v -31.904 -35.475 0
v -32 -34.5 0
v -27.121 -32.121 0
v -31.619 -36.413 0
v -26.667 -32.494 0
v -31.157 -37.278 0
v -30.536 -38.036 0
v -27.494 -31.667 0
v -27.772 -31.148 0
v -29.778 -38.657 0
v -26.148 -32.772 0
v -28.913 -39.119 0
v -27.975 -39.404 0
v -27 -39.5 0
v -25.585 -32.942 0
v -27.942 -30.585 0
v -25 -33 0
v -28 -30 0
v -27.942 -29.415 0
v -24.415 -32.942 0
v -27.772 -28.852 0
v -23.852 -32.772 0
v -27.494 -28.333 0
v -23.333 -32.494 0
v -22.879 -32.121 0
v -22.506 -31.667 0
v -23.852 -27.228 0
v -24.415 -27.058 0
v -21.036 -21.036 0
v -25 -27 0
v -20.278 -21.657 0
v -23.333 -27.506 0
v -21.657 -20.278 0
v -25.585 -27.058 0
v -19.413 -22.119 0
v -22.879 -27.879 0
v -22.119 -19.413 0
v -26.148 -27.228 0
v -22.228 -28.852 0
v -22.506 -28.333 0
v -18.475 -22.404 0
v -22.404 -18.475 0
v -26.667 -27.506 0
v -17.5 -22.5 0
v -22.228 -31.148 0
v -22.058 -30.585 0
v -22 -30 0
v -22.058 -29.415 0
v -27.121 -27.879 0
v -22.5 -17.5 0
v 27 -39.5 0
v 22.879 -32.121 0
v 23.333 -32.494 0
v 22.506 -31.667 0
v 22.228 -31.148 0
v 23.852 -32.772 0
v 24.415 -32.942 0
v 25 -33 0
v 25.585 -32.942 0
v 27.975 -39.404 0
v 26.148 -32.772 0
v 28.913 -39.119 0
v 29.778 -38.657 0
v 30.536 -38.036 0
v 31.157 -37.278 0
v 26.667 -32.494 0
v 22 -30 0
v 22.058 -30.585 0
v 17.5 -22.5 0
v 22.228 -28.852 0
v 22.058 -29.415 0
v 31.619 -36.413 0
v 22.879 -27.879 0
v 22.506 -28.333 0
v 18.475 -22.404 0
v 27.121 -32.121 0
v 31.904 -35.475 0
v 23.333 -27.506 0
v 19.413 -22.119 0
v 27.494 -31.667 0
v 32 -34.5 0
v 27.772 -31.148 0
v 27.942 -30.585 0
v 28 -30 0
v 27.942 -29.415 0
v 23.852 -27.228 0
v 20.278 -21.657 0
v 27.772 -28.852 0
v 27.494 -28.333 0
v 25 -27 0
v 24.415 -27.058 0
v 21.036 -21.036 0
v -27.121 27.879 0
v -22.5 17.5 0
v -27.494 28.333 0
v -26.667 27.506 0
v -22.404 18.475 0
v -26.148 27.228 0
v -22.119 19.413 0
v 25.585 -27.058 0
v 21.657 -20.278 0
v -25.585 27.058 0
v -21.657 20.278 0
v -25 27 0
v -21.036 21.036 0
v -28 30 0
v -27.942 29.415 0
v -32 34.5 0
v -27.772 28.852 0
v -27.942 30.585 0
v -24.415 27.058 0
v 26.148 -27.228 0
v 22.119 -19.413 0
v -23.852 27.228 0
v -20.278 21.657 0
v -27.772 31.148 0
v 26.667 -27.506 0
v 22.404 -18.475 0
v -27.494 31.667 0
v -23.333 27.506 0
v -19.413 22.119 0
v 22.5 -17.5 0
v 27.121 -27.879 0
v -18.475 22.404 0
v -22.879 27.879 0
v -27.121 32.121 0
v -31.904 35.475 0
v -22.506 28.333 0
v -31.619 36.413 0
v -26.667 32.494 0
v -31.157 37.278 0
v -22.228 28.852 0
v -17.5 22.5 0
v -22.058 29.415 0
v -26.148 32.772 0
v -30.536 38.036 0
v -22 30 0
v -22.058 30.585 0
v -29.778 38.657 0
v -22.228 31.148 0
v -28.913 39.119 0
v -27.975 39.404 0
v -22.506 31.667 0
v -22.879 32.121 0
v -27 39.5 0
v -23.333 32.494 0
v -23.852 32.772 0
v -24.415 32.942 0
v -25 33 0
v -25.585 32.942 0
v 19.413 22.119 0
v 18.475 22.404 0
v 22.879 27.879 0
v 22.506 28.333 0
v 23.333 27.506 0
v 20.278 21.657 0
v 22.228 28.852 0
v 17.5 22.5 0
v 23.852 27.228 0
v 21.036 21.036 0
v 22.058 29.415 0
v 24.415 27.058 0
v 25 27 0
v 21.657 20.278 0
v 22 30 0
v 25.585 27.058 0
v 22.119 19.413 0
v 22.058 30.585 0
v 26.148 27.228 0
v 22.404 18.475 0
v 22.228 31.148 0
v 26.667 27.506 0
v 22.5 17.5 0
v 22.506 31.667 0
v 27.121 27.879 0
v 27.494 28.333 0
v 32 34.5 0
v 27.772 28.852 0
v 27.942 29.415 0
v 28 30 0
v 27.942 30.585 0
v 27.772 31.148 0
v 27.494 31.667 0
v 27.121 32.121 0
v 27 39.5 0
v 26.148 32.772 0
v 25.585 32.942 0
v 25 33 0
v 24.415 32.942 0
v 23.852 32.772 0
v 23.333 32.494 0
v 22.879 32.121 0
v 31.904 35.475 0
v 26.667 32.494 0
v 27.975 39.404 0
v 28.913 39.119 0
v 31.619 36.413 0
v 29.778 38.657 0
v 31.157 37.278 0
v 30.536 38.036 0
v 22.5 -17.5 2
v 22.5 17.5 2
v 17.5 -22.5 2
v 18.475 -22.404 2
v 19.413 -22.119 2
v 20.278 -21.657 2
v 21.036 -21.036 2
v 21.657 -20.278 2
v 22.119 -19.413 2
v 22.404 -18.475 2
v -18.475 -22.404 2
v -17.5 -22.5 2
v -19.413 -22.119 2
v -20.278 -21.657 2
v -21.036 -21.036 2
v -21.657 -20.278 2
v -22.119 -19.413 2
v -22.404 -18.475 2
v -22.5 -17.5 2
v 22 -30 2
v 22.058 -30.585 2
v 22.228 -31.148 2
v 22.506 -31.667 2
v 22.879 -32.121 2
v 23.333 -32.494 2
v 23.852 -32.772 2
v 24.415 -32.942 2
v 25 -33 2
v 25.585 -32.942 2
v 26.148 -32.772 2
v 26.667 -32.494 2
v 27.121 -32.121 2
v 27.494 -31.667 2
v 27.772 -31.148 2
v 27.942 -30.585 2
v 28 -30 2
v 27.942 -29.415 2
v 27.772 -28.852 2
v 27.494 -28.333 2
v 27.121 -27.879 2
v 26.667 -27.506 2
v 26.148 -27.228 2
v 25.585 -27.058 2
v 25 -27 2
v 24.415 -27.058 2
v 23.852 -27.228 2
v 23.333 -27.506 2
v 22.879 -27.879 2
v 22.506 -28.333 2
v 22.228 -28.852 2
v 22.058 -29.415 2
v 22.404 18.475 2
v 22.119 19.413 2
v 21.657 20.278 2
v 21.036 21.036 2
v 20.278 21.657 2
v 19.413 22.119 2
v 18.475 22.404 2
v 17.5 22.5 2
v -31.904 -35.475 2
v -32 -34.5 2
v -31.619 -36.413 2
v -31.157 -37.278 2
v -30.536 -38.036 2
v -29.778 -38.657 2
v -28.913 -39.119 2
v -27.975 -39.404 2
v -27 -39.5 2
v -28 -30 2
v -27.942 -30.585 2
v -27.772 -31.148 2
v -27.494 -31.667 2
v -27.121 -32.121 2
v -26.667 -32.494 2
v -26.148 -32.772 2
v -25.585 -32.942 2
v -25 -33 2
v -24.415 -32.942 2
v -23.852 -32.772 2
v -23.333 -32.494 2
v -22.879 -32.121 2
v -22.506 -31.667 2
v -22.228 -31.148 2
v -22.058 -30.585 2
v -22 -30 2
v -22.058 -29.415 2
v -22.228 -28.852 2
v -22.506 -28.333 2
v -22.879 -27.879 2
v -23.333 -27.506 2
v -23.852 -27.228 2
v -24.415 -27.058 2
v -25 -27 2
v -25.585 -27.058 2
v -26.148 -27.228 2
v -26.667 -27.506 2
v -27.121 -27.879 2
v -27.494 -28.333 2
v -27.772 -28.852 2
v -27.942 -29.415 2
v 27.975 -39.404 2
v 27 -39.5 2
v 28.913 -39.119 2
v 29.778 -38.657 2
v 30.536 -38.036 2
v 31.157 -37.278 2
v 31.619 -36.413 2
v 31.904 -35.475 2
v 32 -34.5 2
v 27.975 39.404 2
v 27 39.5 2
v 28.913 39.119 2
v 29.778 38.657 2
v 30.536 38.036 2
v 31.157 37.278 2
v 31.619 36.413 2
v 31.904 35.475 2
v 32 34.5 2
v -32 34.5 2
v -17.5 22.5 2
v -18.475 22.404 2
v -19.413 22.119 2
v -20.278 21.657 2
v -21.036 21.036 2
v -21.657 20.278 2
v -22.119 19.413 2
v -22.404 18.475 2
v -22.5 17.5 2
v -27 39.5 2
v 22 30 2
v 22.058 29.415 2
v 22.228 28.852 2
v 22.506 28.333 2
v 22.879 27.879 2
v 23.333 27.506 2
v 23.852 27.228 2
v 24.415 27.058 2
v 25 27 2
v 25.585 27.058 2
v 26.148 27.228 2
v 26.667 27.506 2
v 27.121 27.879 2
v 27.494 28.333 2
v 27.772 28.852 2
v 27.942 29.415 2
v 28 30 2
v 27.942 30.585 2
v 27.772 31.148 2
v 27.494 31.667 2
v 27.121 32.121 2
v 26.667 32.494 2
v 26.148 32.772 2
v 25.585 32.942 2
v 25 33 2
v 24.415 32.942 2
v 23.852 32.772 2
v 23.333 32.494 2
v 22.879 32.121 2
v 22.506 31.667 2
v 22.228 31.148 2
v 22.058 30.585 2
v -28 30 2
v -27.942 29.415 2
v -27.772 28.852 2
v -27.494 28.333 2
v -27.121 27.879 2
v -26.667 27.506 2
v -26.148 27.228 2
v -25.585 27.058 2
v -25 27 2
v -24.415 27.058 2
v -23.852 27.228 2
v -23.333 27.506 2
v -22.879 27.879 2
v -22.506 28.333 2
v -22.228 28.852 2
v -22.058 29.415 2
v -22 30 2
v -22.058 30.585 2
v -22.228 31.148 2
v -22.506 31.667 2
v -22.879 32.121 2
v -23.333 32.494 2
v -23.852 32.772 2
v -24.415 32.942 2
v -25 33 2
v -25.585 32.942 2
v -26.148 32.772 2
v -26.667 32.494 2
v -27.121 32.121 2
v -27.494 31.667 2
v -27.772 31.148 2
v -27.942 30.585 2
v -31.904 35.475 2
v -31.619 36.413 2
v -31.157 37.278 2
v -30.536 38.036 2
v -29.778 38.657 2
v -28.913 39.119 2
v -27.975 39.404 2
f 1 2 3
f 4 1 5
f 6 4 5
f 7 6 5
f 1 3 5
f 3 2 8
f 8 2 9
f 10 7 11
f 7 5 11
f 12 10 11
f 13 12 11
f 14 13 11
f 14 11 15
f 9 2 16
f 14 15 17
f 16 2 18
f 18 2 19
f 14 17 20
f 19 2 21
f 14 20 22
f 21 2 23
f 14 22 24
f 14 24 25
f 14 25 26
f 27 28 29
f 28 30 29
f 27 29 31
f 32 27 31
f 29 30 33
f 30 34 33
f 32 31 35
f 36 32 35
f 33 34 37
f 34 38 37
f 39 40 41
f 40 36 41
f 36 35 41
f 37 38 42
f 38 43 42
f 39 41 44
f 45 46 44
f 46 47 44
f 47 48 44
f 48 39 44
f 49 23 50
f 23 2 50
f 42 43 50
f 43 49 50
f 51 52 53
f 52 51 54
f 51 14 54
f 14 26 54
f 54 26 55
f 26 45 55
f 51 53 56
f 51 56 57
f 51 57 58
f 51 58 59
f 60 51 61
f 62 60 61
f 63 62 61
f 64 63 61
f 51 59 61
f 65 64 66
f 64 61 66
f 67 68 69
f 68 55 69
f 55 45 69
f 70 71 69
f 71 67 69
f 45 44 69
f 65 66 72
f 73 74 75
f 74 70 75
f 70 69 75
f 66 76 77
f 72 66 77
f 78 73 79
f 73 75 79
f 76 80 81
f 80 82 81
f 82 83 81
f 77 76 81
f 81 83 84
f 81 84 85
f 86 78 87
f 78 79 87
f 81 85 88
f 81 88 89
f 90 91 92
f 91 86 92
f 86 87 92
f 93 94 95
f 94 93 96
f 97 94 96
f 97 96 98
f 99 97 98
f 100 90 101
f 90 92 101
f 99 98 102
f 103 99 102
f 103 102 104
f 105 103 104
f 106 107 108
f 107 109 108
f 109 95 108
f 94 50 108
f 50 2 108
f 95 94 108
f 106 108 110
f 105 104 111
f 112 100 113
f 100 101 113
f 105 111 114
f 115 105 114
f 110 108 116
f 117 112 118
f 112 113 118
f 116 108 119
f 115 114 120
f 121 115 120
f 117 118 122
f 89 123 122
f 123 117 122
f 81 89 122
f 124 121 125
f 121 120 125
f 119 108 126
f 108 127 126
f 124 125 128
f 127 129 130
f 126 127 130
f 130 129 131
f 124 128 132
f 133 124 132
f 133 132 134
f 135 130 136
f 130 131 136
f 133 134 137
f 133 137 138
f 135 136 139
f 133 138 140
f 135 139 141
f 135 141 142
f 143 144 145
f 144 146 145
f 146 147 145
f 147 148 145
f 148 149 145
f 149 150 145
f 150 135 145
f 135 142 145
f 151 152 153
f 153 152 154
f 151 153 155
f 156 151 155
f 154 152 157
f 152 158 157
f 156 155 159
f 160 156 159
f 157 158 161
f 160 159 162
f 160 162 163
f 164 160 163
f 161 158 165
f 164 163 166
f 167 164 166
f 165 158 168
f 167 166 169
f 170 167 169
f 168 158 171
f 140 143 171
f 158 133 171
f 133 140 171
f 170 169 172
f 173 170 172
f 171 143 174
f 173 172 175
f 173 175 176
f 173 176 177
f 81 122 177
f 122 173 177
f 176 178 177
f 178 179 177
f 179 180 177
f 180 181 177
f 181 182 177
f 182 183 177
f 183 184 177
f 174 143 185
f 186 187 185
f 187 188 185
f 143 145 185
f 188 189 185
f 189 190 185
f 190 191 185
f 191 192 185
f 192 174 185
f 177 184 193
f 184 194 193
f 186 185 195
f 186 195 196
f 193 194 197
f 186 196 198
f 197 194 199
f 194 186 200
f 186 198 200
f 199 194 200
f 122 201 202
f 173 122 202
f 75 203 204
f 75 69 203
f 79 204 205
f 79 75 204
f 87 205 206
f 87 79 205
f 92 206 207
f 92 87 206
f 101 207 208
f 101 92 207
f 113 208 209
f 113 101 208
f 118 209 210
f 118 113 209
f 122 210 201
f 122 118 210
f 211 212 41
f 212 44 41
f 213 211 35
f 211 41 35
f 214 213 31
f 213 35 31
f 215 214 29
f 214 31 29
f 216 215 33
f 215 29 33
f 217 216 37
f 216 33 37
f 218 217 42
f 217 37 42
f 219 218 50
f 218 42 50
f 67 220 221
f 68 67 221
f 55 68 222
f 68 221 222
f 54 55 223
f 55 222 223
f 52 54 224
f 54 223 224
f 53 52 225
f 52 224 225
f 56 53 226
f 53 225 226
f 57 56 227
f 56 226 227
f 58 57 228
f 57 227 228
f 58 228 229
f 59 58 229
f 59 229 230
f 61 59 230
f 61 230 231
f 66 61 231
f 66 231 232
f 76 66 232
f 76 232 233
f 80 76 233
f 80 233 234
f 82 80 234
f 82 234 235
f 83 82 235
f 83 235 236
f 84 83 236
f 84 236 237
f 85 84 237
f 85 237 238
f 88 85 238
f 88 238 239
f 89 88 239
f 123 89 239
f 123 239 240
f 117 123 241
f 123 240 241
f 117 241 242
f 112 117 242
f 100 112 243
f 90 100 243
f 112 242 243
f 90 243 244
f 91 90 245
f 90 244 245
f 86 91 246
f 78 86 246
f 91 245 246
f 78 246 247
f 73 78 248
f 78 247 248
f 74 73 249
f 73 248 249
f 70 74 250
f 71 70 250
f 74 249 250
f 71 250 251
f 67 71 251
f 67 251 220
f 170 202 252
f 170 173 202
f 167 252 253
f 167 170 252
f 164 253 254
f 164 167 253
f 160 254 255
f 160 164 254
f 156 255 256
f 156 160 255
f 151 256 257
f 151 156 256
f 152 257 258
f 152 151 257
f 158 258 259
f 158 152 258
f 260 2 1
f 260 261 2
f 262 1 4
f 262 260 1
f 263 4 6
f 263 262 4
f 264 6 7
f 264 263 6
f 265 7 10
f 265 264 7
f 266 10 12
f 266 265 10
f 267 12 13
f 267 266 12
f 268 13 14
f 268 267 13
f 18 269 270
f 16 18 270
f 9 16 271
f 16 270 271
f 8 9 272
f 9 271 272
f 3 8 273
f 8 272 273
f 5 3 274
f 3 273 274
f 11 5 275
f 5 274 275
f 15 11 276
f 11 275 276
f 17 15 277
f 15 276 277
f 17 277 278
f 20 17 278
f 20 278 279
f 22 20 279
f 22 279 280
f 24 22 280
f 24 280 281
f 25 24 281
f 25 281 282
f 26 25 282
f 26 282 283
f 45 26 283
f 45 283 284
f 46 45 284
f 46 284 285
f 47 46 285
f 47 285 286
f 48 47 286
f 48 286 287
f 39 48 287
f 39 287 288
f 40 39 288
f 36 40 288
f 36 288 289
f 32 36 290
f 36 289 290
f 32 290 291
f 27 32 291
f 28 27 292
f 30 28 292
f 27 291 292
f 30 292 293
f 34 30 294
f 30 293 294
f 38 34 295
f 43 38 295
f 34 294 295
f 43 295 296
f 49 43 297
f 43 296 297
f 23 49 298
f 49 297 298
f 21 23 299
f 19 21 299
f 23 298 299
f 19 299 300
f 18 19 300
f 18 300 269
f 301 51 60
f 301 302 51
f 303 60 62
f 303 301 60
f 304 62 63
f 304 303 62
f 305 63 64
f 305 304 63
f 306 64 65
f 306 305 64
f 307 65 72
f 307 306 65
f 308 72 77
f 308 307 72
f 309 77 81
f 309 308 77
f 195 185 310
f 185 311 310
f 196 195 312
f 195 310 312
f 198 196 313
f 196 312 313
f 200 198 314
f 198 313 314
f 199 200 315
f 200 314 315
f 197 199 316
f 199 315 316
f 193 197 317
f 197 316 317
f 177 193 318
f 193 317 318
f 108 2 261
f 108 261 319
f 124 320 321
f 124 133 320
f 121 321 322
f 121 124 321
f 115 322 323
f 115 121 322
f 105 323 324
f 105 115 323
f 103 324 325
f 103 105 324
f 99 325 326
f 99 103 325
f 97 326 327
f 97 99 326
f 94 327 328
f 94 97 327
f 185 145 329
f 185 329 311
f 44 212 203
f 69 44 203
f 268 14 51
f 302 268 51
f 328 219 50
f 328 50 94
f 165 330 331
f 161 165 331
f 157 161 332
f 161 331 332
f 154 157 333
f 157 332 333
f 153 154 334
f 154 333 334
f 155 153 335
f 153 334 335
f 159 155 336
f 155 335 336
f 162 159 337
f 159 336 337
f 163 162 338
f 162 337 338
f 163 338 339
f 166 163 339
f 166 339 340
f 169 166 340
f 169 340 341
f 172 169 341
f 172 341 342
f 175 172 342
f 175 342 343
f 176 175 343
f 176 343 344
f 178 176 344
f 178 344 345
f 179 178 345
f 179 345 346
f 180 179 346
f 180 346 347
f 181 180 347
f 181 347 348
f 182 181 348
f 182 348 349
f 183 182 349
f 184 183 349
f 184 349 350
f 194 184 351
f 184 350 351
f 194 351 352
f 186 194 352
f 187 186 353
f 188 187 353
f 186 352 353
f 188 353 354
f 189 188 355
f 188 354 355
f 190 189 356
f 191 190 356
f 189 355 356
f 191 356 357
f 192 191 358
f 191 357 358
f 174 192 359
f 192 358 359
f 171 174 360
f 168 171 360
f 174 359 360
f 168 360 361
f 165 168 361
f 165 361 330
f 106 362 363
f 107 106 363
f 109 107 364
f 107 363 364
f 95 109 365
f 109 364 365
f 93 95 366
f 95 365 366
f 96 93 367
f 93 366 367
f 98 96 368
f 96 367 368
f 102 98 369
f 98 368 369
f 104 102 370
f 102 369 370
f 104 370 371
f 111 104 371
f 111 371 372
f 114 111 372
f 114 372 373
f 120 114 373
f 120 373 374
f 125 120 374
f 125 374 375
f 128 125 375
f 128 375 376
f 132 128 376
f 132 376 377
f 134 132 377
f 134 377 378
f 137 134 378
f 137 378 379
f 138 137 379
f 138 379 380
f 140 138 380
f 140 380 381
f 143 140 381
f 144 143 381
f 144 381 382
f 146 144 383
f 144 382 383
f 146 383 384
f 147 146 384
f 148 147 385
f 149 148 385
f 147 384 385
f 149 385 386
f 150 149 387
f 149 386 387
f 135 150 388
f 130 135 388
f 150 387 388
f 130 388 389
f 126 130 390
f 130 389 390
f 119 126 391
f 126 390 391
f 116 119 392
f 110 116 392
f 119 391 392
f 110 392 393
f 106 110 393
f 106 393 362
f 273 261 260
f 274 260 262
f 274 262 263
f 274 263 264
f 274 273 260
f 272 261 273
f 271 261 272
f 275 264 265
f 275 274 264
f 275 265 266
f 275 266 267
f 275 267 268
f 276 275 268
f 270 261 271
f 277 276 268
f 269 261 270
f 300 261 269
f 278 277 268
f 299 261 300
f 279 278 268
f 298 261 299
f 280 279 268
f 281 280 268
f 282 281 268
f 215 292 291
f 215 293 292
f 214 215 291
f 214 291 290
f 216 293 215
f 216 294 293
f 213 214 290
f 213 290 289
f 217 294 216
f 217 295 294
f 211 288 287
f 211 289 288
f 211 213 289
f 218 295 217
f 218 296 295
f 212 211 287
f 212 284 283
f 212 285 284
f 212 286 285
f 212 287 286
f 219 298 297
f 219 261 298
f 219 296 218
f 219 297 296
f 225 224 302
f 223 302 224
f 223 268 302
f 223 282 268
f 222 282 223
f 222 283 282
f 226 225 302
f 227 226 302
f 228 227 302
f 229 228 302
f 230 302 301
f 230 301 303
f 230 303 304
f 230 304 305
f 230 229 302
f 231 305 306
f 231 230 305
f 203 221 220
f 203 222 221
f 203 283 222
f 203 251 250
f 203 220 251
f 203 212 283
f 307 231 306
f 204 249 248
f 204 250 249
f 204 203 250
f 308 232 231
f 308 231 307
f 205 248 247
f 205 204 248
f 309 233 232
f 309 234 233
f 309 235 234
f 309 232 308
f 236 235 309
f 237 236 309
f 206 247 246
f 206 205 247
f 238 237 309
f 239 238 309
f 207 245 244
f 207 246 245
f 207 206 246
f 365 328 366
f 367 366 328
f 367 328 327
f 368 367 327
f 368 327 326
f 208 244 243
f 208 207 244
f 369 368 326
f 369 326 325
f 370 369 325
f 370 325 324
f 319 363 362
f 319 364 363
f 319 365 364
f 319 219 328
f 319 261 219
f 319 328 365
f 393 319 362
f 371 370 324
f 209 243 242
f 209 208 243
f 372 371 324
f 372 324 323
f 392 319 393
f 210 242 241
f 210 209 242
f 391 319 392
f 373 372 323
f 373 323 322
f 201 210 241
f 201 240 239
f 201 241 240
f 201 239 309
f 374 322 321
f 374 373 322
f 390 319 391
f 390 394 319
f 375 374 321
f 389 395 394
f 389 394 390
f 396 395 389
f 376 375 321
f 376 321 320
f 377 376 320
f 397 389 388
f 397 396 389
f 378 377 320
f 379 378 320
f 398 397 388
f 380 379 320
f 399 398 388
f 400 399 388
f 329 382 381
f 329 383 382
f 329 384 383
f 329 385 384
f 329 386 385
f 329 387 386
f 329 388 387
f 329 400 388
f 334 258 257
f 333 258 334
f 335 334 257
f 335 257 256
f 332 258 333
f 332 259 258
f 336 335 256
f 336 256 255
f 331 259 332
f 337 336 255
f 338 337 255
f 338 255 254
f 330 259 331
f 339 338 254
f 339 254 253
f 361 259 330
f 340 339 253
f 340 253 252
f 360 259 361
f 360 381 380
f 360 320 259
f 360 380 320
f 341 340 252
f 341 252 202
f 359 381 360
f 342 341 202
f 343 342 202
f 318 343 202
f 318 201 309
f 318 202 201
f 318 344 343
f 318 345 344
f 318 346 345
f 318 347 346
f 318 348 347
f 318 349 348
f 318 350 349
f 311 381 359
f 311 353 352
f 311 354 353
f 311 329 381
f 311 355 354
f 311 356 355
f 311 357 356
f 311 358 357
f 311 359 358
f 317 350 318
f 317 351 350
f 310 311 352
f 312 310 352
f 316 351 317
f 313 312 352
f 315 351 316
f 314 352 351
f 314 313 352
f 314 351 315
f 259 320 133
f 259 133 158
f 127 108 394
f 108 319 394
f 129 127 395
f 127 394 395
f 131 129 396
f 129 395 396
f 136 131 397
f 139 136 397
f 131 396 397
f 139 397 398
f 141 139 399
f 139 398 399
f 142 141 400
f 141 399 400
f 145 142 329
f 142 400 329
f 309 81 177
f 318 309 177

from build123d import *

# Parameters (mm, degrees)
F0_W     = 64
F0_H     = 79
F0_W_2   = 50
F0_H_2   = 60
F1_DEPTH = 2
F2_D     = 6
F3_R     = 5
F4_W     = 45
F4_H     = 45
F5_DEPTH = 25
F6_R     = 5


with BuildPart() as f1:
    # F0 (on Top) → F1 (new body)
    with BuildSketch(Plane.XY):
        Rectangle(F0_W, F0_H)
        Rectangle(F0_W_2, F0_H_2, mode=Mode.SUBTRACT)
        Rectangle(F0_W_2, F0_H_2)
    extrude(amount=F1_DEPTH)

    # F2 (through all)
    with Locations(Plane(origin=(0, 0, 0), x_dir=(1, 0, 0), z_dir=(0, 0, -1))):
        with Locations((25, 30), (-25, 30), (-25, -30), (25, -30)):
            Hole(F2_D / 2)

    # F3
    f3_edges = [f1.edges().sort_by_distance(p)[0] for p in [
        (-32, -39.5, 1),
        (32, -39.5, 1),
        (-32, 39.5, 1),
        (32, 39.5, 1),
    ]]
    fillet(f3_edges, radius=F3_R)

    # F4 (on face) → F5 (cut)
    with BuildSketch(Plane.XY.offset(2)):
        Rectangle(F4_W, F4_H)
    extrude(amount=-F5_DEPTH, mode=Mode.SUBTRACT)

    # F6
    f6_edges = [f1.edges().sort_by_distance(p)[0] for p in [
        (-22.5, 22.5, 1),
        (22.5, 22.5, 1),
        (22.5, -22.5, 1),
        (-22.5, -22.5, 1),
    ]]
    fillet(f6_edges, radius=F6_R)


solid = f1.part
